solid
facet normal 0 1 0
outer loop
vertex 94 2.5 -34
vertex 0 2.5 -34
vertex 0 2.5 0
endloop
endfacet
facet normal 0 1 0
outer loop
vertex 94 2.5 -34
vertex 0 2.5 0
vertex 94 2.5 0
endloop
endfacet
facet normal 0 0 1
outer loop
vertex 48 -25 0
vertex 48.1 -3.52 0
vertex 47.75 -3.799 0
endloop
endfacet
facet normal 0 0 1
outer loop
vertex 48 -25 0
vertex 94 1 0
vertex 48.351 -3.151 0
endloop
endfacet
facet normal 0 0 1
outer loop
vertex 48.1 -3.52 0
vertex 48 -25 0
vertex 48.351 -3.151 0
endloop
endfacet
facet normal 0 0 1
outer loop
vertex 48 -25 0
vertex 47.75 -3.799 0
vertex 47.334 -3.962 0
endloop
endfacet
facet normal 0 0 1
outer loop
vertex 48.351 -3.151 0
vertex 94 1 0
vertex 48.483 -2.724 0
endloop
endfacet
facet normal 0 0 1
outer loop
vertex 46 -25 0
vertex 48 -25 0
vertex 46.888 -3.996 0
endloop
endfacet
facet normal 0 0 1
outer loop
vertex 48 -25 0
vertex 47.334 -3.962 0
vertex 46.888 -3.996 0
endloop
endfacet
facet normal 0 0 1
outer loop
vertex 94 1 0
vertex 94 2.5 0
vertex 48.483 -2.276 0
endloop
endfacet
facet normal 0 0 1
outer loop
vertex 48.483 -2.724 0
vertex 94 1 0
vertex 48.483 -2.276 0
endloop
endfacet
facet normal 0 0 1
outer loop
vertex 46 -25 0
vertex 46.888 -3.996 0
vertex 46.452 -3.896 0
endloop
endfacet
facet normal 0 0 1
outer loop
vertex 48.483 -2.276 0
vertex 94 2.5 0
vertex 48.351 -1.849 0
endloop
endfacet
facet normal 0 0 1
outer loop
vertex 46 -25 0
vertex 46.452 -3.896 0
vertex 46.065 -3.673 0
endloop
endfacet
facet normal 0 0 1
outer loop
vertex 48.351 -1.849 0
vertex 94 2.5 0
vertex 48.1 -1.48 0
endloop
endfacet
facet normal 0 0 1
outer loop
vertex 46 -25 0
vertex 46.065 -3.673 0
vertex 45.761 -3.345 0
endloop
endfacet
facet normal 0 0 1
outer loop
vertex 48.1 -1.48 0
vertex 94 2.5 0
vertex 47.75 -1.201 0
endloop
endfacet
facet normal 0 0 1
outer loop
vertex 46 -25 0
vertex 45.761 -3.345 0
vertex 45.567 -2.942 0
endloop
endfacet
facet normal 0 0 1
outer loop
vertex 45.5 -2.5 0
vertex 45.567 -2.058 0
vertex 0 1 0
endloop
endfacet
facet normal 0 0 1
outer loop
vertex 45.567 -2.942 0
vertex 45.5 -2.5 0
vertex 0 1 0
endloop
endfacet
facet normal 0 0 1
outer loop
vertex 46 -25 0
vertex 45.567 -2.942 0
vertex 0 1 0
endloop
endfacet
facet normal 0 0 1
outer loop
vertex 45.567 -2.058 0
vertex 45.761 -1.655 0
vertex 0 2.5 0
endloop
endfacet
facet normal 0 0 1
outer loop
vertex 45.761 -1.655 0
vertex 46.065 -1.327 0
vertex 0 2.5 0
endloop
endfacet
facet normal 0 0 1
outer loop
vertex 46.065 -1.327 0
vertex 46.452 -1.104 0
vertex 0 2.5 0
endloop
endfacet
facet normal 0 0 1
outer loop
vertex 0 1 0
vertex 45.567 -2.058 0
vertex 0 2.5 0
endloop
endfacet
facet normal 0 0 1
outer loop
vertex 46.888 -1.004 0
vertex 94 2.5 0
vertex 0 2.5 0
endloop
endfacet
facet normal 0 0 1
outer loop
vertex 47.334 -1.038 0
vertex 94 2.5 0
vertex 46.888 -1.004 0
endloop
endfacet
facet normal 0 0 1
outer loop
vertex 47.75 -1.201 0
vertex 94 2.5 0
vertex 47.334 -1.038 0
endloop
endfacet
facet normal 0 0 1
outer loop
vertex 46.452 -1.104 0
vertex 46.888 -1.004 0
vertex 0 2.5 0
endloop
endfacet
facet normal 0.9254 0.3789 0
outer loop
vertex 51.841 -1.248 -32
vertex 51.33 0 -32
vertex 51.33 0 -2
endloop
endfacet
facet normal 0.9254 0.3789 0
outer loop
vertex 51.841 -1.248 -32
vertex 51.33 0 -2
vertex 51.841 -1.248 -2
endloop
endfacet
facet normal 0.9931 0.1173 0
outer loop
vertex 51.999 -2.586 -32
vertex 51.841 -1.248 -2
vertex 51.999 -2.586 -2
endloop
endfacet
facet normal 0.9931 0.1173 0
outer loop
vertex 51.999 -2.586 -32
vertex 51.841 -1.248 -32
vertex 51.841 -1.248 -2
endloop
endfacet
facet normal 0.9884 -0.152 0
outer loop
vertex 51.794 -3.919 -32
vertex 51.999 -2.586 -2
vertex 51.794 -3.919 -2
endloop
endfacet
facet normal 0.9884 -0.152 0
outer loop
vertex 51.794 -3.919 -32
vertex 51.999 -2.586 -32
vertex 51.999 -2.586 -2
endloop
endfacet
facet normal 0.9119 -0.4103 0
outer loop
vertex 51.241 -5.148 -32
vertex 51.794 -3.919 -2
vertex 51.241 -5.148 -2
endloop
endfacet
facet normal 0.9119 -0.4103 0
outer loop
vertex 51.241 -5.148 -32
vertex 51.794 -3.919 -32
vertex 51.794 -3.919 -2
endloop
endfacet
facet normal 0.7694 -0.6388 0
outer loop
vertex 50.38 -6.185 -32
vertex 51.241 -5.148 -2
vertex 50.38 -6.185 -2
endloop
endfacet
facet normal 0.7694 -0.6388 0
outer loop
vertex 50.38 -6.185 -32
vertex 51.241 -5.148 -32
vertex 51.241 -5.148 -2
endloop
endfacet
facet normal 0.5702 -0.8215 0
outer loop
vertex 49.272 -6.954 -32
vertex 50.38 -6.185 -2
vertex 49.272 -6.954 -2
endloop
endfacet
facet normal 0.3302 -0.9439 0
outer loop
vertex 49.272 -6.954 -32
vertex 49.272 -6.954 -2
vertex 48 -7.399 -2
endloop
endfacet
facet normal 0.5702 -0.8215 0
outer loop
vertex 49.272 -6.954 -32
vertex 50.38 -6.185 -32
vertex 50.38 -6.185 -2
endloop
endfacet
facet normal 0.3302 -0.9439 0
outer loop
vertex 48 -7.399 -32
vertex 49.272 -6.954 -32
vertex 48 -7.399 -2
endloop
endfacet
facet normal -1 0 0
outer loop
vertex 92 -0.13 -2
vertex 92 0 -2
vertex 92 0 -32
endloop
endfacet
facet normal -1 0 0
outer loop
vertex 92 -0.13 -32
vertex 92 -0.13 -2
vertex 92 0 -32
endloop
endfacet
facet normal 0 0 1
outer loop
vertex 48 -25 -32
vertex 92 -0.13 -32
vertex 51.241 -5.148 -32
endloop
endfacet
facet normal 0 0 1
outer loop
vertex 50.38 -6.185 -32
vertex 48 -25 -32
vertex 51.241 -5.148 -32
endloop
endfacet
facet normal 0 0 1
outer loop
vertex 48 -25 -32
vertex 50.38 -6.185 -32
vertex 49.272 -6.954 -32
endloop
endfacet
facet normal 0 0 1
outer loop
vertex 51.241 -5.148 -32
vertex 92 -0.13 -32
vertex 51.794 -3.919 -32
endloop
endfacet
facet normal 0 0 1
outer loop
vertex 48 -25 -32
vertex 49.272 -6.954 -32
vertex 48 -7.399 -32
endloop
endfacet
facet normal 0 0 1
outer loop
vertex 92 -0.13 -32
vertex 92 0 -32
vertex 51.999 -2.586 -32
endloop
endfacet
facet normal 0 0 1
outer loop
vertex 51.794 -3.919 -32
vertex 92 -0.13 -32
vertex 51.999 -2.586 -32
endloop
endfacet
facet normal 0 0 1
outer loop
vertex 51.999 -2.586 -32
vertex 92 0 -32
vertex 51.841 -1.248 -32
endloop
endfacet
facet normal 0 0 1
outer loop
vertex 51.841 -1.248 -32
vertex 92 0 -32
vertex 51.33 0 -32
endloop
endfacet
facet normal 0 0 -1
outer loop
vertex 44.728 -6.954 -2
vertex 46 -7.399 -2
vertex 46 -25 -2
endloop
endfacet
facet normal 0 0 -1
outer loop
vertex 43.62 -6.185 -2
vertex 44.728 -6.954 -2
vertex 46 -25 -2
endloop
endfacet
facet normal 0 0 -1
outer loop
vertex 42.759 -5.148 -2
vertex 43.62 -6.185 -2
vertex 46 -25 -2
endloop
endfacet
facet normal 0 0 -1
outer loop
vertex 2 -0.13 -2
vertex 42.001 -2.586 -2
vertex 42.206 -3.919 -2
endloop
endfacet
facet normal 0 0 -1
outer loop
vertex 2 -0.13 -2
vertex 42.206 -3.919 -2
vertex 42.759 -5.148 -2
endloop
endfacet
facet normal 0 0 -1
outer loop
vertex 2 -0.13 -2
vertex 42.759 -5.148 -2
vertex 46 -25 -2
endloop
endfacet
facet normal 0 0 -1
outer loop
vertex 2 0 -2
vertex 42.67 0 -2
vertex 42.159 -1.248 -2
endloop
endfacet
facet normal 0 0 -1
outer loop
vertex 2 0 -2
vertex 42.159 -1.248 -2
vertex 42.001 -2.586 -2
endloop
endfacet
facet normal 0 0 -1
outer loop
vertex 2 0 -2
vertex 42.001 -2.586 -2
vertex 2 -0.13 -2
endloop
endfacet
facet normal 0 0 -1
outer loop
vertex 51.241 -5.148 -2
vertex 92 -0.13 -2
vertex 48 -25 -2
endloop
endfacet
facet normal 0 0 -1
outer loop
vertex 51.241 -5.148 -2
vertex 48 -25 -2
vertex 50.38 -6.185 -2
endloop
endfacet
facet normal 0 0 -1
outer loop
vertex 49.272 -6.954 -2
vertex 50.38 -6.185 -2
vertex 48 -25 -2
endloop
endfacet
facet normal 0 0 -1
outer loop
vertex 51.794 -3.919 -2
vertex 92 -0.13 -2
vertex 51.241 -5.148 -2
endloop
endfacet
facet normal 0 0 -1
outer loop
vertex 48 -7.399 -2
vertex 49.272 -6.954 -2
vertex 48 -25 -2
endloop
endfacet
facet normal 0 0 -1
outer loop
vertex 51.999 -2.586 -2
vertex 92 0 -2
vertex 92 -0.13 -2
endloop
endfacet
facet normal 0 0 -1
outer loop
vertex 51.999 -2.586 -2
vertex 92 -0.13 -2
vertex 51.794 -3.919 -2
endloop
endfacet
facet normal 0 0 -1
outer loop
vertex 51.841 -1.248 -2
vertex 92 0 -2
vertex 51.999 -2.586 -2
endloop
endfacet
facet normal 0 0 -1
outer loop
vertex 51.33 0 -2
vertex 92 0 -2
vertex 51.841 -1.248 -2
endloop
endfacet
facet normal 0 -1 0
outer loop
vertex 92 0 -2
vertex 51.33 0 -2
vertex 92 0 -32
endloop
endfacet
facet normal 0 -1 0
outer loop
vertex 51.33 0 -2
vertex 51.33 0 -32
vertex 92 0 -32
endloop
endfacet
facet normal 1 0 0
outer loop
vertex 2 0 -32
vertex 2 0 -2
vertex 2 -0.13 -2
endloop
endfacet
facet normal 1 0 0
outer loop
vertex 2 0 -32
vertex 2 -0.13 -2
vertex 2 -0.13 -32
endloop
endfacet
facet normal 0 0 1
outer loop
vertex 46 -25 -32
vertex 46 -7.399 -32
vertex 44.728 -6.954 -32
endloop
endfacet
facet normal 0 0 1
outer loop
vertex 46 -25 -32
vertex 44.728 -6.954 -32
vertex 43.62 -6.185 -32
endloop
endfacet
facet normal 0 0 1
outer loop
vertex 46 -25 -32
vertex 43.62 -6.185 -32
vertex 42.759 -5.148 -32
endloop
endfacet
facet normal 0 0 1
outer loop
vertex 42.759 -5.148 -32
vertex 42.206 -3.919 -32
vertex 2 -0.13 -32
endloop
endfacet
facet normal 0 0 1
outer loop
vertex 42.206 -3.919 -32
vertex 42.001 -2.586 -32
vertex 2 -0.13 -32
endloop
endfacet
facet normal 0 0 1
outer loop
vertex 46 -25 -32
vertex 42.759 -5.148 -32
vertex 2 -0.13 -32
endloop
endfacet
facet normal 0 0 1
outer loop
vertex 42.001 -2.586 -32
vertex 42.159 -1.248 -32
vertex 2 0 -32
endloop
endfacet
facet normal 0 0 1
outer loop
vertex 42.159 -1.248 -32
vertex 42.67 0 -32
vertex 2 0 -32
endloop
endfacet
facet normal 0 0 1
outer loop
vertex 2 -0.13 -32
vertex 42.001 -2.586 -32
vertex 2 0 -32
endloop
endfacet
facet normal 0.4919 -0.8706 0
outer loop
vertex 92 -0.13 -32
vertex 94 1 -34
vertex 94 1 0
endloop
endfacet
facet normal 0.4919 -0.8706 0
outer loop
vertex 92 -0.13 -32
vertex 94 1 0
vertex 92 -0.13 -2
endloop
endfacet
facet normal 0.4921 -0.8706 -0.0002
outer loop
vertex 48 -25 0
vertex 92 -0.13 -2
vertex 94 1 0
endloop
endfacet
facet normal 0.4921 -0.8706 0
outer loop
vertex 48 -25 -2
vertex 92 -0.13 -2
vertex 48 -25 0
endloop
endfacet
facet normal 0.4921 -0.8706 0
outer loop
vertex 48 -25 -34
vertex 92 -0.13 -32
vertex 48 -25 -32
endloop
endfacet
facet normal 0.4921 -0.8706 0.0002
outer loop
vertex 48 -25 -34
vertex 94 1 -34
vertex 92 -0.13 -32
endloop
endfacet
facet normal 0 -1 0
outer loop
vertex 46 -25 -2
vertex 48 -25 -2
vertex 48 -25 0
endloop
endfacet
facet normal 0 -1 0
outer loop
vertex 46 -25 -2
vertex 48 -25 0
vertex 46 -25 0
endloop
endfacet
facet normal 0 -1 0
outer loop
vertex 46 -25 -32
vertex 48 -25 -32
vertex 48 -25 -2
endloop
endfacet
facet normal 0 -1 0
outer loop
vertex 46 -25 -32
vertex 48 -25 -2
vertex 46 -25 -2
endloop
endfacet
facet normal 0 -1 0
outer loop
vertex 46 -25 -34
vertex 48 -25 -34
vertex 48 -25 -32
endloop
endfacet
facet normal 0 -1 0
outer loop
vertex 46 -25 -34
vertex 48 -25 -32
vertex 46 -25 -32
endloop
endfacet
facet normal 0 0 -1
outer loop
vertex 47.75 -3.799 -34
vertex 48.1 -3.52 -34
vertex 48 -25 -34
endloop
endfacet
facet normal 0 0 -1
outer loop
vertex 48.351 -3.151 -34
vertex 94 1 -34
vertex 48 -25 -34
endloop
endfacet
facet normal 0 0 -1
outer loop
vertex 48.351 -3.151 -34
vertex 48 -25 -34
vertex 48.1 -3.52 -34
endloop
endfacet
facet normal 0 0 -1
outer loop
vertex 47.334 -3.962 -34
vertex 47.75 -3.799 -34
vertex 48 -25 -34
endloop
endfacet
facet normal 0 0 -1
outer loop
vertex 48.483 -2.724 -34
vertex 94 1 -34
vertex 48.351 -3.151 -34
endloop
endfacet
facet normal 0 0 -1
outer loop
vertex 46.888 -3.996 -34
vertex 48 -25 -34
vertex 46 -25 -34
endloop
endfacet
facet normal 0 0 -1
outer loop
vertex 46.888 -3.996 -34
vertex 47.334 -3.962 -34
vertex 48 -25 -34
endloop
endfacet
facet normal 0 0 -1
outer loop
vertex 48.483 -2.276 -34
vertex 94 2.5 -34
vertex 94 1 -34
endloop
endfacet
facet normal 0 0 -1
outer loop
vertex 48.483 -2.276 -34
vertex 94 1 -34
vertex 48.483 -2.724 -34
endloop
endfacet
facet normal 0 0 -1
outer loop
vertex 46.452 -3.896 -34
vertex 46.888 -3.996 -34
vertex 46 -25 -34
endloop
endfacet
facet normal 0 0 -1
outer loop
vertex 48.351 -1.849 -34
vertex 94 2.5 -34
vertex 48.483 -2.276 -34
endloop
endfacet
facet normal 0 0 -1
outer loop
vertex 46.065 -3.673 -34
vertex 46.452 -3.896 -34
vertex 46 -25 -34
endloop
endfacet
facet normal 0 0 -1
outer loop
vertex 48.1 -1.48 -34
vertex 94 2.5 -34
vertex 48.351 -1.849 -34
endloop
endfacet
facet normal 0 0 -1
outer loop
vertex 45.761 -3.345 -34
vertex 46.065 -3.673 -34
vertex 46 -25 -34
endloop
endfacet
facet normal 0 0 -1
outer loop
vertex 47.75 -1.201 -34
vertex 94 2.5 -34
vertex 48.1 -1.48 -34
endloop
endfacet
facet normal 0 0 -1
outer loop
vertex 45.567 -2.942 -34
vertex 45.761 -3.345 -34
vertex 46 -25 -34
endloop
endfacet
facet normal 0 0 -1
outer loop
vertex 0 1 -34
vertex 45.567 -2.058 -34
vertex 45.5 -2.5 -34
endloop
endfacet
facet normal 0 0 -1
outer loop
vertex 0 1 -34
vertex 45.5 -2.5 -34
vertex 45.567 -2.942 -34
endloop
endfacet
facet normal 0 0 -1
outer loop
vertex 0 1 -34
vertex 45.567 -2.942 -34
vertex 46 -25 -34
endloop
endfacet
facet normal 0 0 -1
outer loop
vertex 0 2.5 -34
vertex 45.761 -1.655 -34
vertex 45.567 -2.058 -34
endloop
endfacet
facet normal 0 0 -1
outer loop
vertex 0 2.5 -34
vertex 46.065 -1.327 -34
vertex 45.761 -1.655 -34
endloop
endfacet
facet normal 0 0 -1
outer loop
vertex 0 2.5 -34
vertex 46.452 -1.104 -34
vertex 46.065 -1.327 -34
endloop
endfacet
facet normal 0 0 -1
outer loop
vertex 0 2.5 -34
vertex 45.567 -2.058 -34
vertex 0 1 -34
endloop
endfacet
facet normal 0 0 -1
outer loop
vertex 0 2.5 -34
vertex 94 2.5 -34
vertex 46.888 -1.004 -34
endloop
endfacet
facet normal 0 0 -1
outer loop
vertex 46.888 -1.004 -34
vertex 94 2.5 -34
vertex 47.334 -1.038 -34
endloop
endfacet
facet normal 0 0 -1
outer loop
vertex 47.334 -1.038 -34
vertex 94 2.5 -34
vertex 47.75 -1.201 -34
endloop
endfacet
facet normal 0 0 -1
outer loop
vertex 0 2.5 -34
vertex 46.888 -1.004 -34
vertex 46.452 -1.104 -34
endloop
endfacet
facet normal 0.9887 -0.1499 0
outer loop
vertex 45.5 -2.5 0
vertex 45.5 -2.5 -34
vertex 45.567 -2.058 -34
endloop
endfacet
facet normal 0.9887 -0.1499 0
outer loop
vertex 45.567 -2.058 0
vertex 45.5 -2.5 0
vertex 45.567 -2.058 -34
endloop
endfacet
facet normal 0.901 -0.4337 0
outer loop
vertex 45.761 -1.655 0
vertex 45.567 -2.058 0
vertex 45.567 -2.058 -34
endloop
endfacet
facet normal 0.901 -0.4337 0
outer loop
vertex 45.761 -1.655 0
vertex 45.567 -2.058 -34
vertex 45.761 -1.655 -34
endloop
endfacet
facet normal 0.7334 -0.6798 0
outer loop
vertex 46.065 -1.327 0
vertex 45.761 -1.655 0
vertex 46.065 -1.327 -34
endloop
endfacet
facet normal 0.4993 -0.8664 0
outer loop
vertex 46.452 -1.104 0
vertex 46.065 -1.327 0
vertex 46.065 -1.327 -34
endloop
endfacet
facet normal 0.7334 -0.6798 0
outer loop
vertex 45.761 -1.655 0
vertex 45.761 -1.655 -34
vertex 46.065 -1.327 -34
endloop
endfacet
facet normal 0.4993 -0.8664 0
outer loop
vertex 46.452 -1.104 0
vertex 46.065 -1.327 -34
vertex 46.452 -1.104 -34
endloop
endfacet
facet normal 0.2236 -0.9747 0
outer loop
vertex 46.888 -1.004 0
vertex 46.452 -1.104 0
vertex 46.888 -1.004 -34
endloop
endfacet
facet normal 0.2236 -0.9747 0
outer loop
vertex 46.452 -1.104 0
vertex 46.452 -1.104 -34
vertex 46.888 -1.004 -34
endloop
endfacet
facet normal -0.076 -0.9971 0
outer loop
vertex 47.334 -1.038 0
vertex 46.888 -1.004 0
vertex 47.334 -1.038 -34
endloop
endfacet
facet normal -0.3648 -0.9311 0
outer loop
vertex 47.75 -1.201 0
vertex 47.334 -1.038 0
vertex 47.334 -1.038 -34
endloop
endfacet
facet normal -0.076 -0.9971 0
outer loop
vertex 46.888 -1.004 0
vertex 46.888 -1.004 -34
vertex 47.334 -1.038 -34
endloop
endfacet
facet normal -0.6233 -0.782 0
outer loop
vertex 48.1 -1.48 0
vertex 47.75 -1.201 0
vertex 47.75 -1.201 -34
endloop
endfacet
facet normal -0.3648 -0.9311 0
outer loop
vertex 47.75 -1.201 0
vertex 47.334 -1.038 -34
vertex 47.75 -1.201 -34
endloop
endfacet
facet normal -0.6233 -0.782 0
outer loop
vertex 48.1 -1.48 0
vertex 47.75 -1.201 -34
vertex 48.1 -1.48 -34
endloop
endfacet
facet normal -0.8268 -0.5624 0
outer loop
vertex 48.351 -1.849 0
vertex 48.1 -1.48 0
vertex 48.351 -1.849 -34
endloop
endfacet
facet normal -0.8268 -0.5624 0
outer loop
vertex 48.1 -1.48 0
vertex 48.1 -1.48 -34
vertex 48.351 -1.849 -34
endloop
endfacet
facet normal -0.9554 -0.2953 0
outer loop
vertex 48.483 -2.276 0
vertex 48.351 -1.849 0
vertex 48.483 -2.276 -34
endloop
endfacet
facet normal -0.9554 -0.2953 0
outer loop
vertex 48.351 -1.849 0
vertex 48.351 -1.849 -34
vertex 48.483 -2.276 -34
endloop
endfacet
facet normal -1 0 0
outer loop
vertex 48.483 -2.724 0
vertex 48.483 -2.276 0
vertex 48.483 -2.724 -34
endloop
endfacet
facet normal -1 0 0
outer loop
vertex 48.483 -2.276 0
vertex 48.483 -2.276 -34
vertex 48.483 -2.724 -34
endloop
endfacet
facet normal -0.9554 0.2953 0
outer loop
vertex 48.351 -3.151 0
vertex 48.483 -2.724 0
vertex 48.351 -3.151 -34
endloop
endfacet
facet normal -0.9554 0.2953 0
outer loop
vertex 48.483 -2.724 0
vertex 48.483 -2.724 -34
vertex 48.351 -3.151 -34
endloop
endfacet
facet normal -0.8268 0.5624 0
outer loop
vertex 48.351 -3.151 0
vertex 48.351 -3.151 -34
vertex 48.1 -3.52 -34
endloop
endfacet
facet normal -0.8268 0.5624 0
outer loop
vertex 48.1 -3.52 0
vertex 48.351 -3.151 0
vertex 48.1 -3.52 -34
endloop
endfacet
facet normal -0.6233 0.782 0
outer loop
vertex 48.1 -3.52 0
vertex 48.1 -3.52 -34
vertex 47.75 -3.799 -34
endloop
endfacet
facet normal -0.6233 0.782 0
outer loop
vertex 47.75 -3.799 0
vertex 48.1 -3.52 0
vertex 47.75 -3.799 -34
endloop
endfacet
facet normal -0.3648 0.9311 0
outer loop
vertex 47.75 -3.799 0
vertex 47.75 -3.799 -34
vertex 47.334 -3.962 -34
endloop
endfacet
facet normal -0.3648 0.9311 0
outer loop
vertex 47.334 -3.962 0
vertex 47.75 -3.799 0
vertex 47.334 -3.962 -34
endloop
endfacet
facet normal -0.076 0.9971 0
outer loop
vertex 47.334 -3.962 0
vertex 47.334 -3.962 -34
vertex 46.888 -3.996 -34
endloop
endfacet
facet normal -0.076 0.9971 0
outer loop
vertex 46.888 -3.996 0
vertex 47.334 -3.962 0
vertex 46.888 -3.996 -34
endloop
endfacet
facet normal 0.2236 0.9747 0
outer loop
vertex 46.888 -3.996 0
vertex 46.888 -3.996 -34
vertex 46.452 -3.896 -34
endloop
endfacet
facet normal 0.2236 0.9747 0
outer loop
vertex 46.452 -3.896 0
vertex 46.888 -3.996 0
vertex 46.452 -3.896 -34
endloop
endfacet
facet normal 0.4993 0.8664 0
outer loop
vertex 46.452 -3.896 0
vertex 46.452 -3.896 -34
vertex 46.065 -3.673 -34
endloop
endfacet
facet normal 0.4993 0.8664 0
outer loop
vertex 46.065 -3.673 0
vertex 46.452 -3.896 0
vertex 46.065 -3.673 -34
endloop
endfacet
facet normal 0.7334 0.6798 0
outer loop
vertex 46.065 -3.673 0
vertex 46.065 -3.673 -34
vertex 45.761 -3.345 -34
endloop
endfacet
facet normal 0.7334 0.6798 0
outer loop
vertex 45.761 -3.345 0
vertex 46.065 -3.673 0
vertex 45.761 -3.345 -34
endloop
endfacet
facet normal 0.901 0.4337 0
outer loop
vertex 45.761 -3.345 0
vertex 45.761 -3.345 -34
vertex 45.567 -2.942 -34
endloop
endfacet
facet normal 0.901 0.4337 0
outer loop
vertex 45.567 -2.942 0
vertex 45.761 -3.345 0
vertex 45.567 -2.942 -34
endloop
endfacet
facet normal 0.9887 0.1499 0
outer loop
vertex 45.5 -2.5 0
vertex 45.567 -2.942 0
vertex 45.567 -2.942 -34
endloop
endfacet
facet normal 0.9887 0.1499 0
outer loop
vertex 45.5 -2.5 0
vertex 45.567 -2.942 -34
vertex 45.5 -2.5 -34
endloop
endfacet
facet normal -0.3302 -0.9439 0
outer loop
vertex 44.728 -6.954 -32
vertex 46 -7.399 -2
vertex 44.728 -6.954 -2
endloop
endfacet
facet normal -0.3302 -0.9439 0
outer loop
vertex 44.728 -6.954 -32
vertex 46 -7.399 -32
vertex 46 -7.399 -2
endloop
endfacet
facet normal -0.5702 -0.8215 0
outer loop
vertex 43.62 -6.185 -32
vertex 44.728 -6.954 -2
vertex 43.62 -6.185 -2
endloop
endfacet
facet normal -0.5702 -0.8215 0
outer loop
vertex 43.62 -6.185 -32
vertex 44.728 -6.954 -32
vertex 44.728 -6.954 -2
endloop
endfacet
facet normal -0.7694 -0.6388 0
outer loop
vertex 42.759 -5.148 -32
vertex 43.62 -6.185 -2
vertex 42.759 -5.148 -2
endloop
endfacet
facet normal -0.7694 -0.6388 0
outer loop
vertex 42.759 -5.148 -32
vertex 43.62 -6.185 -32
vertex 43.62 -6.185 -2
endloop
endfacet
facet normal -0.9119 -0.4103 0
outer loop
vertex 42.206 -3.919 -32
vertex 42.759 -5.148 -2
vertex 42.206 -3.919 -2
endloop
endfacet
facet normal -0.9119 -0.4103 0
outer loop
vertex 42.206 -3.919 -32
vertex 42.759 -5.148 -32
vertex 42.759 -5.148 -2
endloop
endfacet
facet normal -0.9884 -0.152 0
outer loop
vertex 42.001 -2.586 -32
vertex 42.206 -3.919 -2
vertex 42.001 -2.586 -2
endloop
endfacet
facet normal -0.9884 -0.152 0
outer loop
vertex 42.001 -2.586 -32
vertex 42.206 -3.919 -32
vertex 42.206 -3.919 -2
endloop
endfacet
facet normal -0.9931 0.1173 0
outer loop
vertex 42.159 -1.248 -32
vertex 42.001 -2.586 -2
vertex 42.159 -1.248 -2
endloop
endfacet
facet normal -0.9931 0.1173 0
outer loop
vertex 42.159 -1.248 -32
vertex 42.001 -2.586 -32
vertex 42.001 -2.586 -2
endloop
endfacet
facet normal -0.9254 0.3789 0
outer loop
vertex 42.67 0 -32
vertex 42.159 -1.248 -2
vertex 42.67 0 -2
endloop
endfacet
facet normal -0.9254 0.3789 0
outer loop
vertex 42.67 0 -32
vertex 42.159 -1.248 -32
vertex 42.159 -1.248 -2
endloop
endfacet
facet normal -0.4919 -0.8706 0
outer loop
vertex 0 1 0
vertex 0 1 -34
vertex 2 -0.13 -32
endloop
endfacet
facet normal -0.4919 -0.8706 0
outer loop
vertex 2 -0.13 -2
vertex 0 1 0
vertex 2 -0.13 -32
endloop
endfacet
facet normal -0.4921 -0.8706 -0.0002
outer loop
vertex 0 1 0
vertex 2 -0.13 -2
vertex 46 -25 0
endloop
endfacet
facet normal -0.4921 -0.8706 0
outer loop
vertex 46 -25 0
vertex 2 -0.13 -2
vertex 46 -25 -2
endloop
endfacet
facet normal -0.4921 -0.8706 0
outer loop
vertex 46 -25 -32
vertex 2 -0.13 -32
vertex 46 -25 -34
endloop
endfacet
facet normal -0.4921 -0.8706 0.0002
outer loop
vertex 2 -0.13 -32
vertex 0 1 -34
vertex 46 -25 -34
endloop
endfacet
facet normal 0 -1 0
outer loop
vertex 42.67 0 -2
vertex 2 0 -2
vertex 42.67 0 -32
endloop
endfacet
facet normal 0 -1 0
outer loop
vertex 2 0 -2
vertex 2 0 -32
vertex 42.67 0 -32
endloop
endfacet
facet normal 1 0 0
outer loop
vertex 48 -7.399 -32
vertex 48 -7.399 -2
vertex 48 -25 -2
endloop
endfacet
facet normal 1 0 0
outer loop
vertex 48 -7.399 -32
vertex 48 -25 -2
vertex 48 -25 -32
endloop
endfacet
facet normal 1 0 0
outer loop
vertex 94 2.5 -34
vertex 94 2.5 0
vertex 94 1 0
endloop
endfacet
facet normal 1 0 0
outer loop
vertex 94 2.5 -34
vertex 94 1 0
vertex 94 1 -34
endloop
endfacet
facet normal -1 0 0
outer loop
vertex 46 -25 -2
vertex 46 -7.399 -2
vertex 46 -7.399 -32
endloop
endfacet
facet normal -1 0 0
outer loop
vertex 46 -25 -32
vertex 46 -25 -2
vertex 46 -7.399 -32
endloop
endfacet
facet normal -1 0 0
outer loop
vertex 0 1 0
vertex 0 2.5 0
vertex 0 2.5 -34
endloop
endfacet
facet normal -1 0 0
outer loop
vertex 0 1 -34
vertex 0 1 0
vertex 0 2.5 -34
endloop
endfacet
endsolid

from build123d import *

# Parameters (mm, degrees)
SKETCH_1_W          = 94
SKETCH_1_H          = 34
EXTRUDE_1_DEPTH     = 2.5
SKETCH_2_W          = 94
SKETCH_2_H          = 34
SKETCH_2_W_2        = 44
SKETCH_2_H_2        = 30
EXTRUDE_2_DEPTH     = 25
CUT_EXTRUDE_1_DEPTH = 104.038827633
SKETCH_7_R          = 5
EXTRUDE_4_DEPTH     = 34
SKETCH_8_R          = 1.5
CUT_EXTRUDE_2_DEPTH = 104.038827633


with BuildPart() as part:
    # 草图1 → 凸台-拉伸1 (new body)
    with BuildSketch(Plane(origin=(0, 0, 0), x_dir=(1, 0, 0), z_dir=(0, 1, 0))):
        with Locations((47, 17)):
            Rectangle(SKETCH_1_W, SKETCH_1_H)
    extrude(amount=EXTRUDE_1_DEPTH)

    # 草图2 → 凸台-拉伸2 (add)
    with BuildSketch(Plane(origin=(0, 0, 0), x_dir=(-1, 0, 0), z_dir=(0, -1, 0))):
        with Locations((-47, 17)):
            Rectangle(SKETCH_2_W, SKETCH_2_H)
        with Locations((-24, 17)):
            Rectangle(SKETCH_2_W_2, SKETCH_2_H_2, mode=Mode.SUBTRACT)
        with Locations((-70, 17)):
            Rectangle(SKETCH_2_W_2, SKETCH_2_H_2, mode=Mode.SUBTRACT)
    extrude(amount=EXTRUDE_2_DEPTH)

    # 草图6 → 切除-拉伸1 (cut, through all)
    with BuildSketch(Plane(origin=(0, 0, -34), x_dir=(-1, 0, 0), z_dir=(0, 0, -1))):
        Polygon((0, -25), (0, 1), (-46, -25), align=None)
        Polygon((-94, -25), (-94, 1), (-48, -25), align=None)
    extrude(amount=-CUT_EXTRUDE_1_DEPTH, mode=Mode.SUBTRACT)

    # 草图7 → 凸台-拉伸4 (add)
    with BuildSketch(Plane(origin=(0, 0, -34), x_dir=(-1, 0, 0), z_dir=(0, 0, -1))):
        with Locations((-47, -2.5)):
            Circle(SKETCH_7_R)
    extrude(amount=-EXTRUDE_4_DEPTH)

    # 草图8 → 切除-拉伸2 (cut, through all)
    with BuildSketch(Plane(origin=(0, 0, -34), x_dir=(-1, 0, 0), z_dir=(0, 0, -1))):
        with Locations((-47, -2.5)):
            Circle(SKETCH_8_R)
    extrude(amount=-CUT_EXTRUDE_2_DEPTH, mode=Mode.SUBTRACT)


solid = part.part
